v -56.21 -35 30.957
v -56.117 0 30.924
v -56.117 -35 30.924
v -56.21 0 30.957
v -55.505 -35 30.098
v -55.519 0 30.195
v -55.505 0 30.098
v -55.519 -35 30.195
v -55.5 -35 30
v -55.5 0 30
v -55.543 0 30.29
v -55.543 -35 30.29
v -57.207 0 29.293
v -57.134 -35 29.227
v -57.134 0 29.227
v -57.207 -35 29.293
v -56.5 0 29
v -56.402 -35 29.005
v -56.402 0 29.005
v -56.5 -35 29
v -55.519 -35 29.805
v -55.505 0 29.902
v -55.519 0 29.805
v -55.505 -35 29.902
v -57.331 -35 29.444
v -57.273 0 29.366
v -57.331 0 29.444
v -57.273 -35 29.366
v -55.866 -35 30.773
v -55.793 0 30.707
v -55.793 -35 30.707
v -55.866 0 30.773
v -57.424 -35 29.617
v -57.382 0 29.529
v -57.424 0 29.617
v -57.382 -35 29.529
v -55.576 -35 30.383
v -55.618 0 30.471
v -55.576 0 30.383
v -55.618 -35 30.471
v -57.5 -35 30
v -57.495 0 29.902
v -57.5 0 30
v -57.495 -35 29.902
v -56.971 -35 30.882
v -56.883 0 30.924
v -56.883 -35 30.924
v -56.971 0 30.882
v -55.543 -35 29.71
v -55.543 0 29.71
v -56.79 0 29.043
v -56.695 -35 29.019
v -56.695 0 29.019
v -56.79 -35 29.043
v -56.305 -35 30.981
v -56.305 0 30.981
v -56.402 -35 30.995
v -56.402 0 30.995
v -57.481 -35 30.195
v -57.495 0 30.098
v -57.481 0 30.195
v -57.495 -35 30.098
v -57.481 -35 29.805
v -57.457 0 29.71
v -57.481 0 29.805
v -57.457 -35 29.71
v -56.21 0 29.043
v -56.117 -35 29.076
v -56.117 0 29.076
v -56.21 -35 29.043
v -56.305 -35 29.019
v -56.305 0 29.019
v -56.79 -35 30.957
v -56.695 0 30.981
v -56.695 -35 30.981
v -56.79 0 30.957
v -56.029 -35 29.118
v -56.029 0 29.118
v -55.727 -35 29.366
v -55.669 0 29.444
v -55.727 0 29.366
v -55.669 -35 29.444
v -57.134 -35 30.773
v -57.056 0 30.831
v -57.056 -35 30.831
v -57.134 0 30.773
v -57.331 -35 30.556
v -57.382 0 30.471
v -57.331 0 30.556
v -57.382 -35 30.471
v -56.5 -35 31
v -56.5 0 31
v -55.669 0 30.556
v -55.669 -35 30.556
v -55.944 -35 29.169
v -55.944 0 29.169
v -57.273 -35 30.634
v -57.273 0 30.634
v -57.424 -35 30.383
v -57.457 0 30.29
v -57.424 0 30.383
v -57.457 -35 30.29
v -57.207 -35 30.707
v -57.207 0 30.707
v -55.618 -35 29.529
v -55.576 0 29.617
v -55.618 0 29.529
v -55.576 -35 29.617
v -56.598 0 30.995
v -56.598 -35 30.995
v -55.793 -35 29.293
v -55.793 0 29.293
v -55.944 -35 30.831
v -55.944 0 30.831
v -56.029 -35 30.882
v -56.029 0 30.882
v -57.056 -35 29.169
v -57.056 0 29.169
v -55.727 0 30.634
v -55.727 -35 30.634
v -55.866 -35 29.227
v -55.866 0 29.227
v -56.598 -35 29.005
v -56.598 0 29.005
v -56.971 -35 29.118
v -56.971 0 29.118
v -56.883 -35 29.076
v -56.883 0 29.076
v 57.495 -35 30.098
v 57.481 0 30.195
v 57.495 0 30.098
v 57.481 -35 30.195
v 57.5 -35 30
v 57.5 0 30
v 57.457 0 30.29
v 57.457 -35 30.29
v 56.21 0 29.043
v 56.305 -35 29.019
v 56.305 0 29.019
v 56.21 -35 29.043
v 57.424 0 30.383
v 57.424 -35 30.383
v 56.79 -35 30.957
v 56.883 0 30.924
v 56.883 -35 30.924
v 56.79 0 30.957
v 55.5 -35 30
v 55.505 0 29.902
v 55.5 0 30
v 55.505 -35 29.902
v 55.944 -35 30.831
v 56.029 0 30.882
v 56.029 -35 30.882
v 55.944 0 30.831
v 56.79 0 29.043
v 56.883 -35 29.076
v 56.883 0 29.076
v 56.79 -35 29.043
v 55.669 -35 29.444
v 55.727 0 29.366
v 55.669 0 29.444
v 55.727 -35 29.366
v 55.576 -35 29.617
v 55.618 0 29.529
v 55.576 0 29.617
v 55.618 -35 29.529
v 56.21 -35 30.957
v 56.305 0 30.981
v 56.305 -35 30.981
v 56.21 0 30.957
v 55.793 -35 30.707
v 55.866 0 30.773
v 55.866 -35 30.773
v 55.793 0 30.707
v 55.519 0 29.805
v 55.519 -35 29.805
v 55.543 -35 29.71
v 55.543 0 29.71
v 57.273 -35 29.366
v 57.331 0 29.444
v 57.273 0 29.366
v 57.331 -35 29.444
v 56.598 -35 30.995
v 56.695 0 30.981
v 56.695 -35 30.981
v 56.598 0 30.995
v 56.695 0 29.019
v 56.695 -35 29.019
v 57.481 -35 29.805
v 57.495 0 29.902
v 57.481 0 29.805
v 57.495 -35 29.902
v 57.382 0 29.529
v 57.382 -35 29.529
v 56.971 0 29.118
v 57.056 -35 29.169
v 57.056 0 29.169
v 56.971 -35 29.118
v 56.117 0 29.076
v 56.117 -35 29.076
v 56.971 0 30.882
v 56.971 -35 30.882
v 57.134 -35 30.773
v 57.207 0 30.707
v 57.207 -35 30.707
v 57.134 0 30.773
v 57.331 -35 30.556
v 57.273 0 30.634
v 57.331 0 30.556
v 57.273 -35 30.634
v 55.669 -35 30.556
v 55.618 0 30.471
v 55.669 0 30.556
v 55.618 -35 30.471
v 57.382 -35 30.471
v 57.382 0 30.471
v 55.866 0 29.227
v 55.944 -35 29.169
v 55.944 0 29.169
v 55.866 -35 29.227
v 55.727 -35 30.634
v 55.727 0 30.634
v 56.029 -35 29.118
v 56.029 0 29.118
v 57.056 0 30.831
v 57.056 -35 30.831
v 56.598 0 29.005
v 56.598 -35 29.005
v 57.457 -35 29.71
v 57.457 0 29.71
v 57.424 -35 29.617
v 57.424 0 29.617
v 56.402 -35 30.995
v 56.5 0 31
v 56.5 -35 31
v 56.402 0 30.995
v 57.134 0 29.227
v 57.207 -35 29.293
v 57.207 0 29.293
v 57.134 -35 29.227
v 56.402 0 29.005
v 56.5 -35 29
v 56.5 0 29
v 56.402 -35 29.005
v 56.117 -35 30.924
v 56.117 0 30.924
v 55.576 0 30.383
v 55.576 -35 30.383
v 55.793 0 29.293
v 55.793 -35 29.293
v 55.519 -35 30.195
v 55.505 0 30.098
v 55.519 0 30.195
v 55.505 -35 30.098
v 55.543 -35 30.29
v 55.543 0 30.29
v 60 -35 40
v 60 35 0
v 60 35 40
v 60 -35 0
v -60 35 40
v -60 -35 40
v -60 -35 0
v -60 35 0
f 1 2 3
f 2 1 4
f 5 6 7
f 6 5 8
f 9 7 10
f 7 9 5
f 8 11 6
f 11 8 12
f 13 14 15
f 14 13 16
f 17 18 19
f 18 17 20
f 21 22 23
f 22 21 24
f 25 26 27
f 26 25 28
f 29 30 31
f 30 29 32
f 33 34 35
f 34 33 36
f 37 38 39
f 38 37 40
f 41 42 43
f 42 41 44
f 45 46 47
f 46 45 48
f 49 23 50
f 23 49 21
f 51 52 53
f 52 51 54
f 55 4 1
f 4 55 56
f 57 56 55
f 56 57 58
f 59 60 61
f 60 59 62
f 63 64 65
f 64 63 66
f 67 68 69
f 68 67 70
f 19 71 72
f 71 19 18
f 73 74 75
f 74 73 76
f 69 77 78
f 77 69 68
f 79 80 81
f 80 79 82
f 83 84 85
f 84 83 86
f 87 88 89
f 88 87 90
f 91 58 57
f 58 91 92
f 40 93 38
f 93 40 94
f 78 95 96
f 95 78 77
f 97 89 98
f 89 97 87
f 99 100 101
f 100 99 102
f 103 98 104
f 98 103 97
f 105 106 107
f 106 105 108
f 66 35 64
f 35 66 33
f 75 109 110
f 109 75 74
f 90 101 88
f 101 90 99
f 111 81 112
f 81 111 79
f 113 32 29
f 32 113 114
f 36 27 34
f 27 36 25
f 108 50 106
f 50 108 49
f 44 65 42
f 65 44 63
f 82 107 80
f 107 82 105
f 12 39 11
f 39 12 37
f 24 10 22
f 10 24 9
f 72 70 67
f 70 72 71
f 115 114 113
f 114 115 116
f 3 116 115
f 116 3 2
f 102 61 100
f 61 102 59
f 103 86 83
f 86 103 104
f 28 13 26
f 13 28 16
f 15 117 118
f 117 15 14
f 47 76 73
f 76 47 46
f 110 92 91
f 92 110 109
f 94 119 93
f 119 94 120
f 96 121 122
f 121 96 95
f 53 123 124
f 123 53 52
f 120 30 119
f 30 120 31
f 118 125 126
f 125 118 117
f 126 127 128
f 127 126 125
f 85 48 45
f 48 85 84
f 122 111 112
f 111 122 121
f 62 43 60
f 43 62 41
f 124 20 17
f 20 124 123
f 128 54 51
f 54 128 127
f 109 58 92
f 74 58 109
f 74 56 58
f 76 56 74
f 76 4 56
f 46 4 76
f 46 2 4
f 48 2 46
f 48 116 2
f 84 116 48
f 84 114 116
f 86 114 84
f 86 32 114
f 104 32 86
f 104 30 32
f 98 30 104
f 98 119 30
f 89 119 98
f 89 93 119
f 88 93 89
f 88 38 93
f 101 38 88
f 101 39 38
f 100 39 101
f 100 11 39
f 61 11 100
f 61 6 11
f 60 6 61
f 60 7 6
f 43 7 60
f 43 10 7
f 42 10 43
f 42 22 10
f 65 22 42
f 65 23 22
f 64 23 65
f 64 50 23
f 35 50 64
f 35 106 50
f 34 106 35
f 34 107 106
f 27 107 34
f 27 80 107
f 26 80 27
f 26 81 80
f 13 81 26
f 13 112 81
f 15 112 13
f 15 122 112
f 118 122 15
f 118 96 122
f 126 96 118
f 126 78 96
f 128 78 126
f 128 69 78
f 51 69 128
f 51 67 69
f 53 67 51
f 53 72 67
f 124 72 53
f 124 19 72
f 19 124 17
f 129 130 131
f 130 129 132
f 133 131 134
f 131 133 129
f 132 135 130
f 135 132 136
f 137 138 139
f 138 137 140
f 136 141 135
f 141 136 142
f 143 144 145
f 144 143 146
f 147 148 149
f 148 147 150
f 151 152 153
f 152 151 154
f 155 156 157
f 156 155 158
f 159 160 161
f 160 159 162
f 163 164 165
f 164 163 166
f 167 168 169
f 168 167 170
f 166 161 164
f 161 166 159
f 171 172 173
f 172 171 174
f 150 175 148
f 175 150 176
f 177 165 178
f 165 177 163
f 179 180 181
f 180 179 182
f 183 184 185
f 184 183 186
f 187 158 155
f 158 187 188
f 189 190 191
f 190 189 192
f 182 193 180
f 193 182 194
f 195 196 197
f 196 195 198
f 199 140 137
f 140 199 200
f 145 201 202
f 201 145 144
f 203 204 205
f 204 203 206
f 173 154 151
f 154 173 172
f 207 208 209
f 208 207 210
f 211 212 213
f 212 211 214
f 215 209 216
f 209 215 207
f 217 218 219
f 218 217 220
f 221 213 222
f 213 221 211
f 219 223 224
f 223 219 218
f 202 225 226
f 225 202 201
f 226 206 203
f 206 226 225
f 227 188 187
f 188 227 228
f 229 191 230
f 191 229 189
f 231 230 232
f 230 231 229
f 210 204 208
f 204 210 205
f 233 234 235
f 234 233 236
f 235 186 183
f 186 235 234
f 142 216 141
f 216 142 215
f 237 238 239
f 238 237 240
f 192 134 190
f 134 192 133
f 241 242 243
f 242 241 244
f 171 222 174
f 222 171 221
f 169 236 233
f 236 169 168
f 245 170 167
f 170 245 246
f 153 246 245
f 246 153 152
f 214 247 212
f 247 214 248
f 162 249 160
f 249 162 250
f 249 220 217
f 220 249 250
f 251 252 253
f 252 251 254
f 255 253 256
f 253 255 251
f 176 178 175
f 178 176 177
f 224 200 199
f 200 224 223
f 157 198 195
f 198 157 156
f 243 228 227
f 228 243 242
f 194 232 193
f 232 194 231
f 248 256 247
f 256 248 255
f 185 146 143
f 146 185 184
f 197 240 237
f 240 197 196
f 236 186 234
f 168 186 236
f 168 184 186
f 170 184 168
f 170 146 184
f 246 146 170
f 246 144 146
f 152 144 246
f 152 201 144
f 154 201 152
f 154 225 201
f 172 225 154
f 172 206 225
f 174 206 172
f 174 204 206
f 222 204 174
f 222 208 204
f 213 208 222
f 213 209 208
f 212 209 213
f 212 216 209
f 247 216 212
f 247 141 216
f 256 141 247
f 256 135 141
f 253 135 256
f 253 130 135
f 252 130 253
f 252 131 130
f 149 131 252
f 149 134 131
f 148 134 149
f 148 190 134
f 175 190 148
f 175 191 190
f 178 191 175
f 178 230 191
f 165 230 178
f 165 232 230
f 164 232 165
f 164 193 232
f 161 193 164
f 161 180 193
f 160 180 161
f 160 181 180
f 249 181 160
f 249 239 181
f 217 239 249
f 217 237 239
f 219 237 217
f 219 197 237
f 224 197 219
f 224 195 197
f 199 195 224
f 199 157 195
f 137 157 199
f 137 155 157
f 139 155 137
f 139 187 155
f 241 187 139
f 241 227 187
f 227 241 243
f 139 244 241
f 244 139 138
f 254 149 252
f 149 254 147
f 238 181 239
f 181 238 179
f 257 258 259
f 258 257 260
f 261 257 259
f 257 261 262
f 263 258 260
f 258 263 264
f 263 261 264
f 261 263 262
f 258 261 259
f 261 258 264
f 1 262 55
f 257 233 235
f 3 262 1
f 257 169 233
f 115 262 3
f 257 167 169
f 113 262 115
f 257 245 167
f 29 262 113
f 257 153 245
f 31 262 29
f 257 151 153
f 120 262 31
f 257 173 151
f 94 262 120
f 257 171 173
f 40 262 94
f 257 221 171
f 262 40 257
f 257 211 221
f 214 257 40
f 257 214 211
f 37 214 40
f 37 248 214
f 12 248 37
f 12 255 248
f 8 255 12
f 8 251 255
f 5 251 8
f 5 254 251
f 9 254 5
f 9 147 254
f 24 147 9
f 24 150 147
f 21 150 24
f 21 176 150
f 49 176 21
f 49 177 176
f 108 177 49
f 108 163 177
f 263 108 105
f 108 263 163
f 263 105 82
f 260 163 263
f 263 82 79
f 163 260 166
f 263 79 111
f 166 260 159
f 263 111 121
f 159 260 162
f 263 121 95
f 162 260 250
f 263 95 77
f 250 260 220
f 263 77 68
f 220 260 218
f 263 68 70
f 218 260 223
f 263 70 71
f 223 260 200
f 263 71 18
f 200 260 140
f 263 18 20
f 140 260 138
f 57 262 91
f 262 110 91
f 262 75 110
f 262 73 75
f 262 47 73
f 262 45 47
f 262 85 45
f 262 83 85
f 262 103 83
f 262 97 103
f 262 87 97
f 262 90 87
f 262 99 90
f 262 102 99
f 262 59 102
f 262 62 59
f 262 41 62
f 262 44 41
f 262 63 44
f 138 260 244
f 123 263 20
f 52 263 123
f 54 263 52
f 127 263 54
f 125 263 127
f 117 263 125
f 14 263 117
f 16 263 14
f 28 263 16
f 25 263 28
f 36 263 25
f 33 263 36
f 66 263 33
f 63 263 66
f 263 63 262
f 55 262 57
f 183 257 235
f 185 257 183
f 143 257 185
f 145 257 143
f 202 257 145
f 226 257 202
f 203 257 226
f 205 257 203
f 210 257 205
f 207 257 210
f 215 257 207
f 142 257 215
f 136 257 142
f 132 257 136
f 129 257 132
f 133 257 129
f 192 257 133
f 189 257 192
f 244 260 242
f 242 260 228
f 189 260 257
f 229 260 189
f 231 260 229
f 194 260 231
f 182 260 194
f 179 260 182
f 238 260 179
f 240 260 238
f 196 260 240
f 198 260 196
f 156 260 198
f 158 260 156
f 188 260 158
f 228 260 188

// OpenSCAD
// Mini horizontal gel-electrophoresis box - buffer tank
// Print orientation: tank bottom on the bed (z = 0), open top.

$fn = 64;

// ---- Tank dimensions ----
outer_x    = 120;   // outer length along X
outer_y    = 70;    // outer width along Y
tank_h     = 40;    // overall height (Z)
wall       = 3;     // wall thickness
floor      = 3;     // floor thickness under the lowest chamber

// ---- Platform (gel tray support) ----
plat_x     = 60;    // platform length along X
plat_y     = outer_y; // platform spans the full inner width
plat_top_z = 10;    // height of platform top above the inner floor

// ---- Electrode holes ----
hole_d     = 2;     // hole diameter
hole_y     = 0;     // hole Y position
hole_z     = 30;    // hole Z position
eps        = 0.5;   // cutter overshoot past end walls

// Derived values
inner_h    = tank_h - floor;                    // height above floor
plat_z0    = floor + (plat_top_z - wall);       // platform bottom height
region_x   = outer_x / 2 - wall;                // half-width of end chambers

difference() {
    // Main tank body
    translate([-outer_x / 2, -outer_y / 2, 0])
        cube([outer_x, outer_y, tank_h]);

    // Raised platform, full width, centred in X
    translate([-plat_x / 2, -plat_y / 2, plat_z0])
        cube([plat_x, plat_y, plat_top_z - plat_z0]);

    // Horizontal electrode holes through each end wall
    for (sx = [-1, 1])
        translate([sx * (region_x - eps), hole_y, hole_z])
            rotate([90, 0, 0])
                cylinder(d = hole_d, h = outer_y + 2 * eps);
}
